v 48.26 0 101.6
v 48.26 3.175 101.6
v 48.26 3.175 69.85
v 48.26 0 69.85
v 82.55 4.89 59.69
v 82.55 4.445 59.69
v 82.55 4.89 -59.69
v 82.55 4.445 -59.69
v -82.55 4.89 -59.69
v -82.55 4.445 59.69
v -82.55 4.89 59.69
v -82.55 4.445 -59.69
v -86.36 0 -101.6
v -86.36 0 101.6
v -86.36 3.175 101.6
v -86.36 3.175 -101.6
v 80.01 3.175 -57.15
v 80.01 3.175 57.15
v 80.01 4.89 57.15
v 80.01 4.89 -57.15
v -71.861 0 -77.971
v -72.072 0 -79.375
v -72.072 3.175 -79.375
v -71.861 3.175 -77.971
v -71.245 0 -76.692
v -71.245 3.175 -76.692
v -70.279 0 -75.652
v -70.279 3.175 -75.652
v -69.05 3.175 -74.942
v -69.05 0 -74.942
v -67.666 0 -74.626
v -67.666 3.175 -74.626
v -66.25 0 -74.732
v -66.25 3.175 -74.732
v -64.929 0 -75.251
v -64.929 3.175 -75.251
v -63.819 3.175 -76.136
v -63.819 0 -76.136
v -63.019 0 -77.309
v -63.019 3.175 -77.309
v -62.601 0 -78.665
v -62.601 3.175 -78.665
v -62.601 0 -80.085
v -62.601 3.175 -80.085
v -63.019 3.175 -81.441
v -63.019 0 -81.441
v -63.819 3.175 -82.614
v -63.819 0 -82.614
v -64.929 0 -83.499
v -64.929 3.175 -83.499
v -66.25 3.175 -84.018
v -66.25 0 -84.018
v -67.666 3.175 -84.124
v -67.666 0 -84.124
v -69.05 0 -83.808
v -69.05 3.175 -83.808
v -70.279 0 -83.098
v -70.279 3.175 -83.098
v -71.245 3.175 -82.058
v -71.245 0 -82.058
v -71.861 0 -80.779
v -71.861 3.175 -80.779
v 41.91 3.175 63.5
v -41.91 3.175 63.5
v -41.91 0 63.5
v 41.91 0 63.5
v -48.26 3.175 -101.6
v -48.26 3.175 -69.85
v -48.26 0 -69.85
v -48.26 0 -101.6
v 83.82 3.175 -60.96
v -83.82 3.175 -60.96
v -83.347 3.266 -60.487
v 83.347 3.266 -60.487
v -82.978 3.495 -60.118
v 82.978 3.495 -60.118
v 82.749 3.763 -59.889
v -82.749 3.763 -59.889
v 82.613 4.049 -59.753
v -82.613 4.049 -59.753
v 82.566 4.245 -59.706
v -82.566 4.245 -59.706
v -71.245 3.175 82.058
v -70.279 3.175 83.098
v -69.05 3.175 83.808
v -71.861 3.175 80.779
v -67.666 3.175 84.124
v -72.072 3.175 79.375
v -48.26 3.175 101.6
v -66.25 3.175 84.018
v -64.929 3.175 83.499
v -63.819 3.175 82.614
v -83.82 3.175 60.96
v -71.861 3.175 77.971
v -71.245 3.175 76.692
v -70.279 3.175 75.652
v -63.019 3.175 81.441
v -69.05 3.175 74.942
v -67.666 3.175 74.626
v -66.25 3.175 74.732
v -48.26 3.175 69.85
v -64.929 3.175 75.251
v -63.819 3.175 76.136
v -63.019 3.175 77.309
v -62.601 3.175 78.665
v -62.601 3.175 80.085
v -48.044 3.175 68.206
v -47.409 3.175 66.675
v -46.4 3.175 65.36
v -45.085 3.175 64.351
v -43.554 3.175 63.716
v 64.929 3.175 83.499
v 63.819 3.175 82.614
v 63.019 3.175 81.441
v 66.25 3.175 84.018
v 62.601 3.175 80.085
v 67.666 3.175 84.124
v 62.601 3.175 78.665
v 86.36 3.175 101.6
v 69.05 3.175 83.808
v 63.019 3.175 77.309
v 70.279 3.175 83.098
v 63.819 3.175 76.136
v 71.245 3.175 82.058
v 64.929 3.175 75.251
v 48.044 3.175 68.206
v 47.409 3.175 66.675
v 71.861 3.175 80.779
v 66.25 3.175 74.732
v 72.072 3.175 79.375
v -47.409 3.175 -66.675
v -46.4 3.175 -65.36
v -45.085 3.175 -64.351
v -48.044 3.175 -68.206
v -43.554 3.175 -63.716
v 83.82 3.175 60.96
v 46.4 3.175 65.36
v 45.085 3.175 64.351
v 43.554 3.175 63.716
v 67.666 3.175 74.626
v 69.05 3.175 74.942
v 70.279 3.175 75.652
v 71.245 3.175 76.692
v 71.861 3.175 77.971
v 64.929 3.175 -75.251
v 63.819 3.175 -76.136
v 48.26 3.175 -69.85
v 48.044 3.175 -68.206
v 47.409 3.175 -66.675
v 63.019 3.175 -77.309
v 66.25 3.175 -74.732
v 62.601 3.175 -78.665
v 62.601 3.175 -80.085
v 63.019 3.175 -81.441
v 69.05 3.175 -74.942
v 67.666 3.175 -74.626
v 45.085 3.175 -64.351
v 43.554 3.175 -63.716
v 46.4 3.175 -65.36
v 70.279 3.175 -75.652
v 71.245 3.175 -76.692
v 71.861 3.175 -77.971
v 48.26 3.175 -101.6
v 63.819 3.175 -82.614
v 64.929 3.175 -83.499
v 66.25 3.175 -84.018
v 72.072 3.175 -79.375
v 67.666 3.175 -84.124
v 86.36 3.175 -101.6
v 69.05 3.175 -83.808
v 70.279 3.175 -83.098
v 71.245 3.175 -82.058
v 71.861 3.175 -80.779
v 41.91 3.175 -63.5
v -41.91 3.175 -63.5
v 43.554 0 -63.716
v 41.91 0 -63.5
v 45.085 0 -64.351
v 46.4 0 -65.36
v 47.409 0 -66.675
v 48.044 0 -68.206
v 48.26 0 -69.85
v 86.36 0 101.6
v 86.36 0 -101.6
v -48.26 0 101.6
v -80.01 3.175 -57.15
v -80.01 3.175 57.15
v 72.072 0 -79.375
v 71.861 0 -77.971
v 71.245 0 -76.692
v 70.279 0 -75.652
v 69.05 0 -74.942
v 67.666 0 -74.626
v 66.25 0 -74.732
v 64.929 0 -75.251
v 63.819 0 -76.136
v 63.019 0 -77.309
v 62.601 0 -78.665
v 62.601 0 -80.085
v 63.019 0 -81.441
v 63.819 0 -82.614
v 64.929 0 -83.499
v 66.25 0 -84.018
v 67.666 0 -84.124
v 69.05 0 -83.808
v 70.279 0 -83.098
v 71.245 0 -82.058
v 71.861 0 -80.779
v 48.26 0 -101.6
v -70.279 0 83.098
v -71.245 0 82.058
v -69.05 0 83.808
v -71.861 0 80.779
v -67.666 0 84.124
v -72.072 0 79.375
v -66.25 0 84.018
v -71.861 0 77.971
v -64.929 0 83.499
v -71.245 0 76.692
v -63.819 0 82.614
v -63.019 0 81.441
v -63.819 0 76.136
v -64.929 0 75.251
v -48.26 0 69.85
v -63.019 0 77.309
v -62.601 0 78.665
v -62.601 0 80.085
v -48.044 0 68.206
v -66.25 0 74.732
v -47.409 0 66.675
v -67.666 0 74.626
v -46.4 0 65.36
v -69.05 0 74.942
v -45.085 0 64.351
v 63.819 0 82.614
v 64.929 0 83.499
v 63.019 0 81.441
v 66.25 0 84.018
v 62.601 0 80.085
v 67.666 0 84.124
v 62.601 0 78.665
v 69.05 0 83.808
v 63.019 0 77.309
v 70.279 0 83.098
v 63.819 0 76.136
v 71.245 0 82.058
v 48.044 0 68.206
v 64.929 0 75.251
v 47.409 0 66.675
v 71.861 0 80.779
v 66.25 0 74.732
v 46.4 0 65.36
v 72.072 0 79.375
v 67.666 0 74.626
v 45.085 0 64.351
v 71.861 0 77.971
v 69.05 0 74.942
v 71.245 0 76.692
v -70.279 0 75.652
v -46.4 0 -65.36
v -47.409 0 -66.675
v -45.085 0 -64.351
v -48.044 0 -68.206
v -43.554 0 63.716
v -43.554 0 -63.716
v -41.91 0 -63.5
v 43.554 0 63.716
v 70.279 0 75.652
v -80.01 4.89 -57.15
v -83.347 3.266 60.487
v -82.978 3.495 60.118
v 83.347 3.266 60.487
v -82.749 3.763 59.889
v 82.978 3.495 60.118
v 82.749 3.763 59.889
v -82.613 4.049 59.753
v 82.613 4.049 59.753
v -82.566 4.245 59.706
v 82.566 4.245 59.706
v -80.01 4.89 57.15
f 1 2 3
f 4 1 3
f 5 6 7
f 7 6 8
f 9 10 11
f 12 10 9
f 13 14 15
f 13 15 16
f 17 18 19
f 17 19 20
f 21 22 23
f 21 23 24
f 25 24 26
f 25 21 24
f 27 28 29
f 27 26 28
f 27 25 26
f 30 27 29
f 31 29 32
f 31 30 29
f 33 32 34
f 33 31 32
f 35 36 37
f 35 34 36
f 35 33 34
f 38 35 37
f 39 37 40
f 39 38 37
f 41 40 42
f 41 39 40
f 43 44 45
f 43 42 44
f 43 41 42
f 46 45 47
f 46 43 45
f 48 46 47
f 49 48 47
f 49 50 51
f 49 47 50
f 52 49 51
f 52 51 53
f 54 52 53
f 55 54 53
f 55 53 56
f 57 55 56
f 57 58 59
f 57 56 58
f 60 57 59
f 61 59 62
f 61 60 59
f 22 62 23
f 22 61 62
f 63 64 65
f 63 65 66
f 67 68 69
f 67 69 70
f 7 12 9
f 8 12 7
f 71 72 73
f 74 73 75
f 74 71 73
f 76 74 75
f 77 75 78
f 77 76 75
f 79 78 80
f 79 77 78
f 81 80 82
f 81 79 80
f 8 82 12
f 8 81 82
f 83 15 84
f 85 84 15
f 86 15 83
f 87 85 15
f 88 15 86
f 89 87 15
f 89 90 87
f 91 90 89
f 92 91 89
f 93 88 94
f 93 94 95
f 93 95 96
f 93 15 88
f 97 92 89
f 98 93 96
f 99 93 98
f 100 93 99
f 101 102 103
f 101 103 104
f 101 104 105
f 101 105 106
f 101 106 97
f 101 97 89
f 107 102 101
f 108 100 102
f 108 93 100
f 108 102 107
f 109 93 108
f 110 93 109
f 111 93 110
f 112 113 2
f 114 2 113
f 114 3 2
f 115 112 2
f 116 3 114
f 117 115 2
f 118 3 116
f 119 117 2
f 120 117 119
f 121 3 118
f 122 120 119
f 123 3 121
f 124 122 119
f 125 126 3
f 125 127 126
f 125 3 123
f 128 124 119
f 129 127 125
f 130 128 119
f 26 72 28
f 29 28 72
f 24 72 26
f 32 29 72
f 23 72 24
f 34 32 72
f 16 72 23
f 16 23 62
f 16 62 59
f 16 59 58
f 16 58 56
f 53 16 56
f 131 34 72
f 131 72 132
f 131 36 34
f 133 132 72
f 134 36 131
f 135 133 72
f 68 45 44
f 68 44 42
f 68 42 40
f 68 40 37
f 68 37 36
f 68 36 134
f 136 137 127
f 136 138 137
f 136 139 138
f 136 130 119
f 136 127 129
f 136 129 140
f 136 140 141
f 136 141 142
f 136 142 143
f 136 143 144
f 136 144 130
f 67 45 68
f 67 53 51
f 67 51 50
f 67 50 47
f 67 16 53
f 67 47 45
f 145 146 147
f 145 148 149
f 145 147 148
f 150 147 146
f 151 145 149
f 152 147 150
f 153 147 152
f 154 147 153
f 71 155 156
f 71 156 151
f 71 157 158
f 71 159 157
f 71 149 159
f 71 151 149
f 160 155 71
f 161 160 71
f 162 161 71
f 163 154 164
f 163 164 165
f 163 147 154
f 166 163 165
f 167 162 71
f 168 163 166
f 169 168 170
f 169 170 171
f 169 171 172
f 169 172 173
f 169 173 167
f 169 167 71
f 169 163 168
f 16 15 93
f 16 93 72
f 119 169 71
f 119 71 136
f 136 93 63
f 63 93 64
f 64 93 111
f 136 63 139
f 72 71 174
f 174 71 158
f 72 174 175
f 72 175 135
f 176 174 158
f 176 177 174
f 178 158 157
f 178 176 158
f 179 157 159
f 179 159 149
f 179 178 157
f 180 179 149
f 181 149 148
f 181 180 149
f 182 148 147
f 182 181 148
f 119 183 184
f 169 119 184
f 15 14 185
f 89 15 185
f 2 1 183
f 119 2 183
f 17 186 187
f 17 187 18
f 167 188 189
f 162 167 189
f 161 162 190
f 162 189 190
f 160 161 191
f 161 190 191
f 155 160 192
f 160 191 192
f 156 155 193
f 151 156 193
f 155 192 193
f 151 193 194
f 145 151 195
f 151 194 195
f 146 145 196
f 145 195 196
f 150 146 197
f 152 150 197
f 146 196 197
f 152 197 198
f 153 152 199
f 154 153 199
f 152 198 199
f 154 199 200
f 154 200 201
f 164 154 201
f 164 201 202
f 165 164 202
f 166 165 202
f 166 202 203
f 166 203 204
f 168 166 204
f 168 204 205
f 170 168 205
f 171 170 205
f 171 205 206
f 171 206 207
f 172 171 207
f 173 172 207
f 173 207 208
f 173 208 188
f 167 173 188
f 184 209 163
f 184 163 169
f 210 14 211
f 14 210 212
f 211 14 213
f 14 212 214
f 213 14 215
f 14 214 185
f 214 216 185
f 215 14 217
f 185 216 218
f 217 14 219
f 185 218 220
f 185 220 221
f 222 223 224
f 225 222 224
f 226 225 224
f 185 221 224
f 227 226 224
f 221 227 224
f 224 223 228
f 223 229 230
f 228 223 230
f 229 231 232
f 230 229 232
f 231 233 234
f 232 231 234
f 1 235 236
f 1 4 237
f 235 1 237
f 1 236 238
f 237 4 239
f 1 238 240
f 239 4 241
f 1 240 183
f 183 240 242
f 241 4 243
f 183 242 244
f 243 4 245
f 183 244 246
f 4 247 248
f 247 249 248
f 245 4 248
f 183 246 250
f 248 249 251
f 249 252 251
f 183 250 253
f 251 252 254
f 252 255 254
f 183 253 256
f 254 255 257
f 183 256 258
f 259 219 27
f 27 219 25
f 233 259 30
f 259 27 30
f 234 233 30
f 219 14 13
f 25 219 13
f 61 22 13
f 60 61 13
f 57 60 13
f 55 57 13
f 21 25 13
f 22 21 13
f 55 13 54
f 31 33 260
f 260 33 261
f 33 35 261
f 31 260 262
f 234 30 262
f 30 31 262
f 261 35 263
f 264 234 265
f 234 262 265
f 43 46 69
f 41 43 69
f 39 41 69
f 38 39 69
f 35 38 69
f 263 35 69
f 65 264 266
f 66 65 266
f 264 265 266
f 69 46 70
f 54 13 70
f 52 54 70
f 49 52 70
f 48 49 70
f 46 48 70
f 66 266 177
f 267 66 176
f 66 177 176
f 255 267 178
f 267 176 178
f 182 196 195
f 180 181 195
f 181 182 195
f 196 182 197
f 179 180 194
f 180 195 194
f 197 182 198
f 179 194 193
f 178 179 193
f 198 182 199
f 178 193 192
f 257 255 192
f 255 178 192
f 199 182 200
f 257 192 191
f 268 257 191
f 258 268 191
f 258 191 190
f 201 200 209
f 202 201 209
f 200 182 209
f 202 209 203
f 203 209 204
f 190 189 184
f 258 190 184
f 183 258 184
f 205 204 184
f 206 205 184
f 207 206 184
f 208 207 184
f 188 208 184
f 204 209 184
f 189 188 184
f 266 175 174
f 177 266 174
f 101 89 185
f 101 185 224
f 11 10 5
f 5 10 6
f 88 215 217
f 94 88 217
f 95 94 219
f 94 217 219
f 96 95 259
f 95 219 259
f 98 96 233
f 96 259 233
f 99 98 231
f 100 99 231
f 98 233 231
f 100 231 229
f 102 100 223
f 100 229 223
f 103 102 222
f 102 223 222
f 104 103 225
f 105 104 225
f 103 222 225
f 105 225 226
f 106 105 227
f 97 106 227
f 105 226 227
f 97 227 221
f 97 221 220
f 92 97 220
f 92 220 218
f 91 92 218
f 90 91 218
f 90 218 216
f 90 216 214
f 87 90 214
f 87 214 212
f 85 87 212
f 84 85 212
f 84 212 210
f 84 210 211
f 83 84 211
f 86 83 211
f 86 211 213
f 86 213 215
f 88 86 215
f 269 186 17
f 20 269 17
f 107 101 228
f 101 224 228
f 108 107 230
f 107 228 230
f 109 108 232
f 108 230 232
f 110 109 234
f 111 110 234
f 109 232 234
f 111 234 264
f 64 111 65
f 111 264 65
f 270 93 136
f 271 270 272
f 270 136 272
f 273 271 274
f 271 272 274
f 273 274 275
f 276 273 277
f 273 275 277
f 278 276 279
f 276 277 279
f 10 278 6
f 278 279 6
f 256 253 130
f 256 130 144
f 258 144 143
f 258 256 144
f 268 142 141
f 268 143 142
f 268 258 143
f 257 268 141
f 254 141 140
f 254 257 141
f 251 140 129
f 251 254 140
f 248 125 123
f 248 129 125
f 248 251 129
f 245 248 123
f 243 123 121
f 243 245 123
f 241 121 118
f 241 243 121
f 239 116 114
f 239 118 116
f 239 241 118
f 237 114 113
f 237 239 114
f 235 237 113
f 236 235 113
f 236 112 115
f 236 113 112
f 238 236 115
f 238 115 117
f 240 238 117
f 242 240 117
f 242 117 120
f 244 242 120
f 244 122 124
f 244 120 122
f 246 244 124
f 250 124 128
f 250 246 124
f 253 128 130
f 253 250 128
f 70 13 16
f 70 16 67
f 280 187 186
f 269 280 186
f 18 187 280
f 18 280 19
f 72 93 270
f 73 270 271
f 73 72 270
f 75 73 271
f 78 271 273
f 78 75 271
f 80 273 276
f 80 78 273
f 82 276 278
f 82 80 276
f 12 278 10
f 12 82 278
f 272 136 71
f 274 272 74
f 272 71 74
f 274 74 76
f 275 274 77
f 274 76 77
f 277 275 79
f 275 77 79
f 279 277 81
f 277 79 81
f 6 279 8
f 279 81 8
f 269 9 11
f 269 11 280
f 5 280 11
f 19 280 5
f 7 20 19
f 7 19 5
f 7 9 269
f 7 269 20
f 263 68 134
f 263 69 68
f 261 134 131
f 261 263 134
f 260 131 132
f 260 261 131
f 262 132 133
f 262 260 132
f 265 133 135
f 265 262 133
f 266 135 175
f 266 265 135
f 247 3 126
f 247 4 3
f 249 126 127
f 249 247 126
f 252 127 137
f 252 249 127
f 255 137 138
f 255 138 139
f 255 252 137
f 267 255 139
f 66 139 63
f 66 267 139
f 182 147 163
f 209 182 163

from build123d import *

# Parameters (mm, degrees)
SKETCH1_W                    = 172.72
SKETCH1_H                    = 203.2
BOSS_EXTRUDE1_DEPTH          = 3.175
SKETCH2_W                    = 96.52
SKETCH2_H                    = 38.1
CUT_EXTRUDE1_DEPTH           = 134.381746221
FILLET1_R                    = 6.35
SKETCH6_W                    = 165.1
SKETCH6_H                    = 119.38
SKETCH6_W_2                  = 160.02
SKETCH6_H_2                  = 114.3
BOSS_EXTRUDE2_DEPTH          = 1.7145
FILLET2_R                    = 1.27
F_3_8_0_375_DIAMETER_HOLE1_D = 9.525
MIRROR5_COPY_1_D             = 9.525


with BuildPart() as part:
    # Sketch1 → Boss-Extrude1 (new body)
    with BuildSketch(Plane(origin=(0, 0, 0), x_dir=(1, 0, 0), z_dir=(0, 1, 0))):
        Rectangle(SKETCH1_W, SKETCH1_H)
    extrude(amount=BOSS_EXTRUDE1_DEPTH)

    # Sketch2 → Cut-Extrude1 (cut, through all)
    with BuildSketch(Plane(origin=(0, 3.175, 0), x_dir=(1, 0, 0), z_dir=(0, 1, 0))):
        with Locations((0, 82.55)):
            Rectangle(SKETCH2_W, SKETCH2_H)
        with Locations((0, -82.55)):
            Rectangle(SKETCH2_W, SKETCH2_H)
    extrude(amount=-CUT_EXTRUDE1_DEPTH, mode=Mode.SUBTRACT)

    # Fillet1
    fillet1_edges = [part.edges().sort_by_distance(p)[0] for p in [
        (-48.26, 1.5875, -63.5),
        (48.26, 1.5875, -63.5),
        (-48.26, 1.5875, 63.5),
        (48.26, 1.5875, 63.5),
    ]]
    fillet(fillet1_edges, radius=FILLET1_R)

    # Sketch6 → Boss-Extrude2 (add)
    with BuildSketch(Plane(origin=(0, 3.175, 0), x_dir=(1, 0, 0), z_dir=(0, 1, 0))):
        Rectangle(SKETCH6_W, SKETCH6_H)
        Rectangle(SKETCH6_W_2, SKETCH6_H_2, mode=Mode.SUBTRACT)
    extrude(amount=BOSS_EXTRUDE2_DEPTH)

    # Fillet2
    fillet2_edges = [part.edges().sort_by_distance(p)[0] for p in [
        (82.55, 3.175, 0),
        (0, 3.175, -59.69),
        (-82.55, 3.175, 0),
        (0, 3.175, 59.69),
    ]]
    fillet(fillet2_edges, radius=FILLET2_R)

    # 3/8 (0.375) Diameter Hole1 (through all)
    with Locations(Plane(origin=(0, 3.175, 0), x_dir=(1, 0, 0), z_dir=(0, 1, 0))):
        with Locations((-67.31, -79.375)):
            f_3_8_0_375_diameter_hole1 = Hole(F_3_8_0_375_DIAMETER_HOLE1_D / 2)

    # Mirror4: 3/8 (0.375) Diameter Hole1 across plane
    add(f_3_8_0_375_diameter_hole1.mirror(Plane.XY), mode=Mode.SUBTRACT)

    # Mirror5: 3/8 (0.375) Diameter Hole1 across plane
    add(f_3_8_0_375_diameter_hole1.mirror(Plane(origin=(0, 0, 0), x_dir=(0, 0, 1), z_dir=(1, 0, 0))), mode=Mode.SUBTRACT)

    # Mirror5 copy 1 (through all)
    with Locations(Plane(origin=(0, 3.175, 0), x_dir=(-1, 0, 0), z_dir=(0, 1, 0))):
        with Locations((-67.31, -79.375)):
            Hole(MIRROR5_COPY_1_D / 2)


solid = part.part
